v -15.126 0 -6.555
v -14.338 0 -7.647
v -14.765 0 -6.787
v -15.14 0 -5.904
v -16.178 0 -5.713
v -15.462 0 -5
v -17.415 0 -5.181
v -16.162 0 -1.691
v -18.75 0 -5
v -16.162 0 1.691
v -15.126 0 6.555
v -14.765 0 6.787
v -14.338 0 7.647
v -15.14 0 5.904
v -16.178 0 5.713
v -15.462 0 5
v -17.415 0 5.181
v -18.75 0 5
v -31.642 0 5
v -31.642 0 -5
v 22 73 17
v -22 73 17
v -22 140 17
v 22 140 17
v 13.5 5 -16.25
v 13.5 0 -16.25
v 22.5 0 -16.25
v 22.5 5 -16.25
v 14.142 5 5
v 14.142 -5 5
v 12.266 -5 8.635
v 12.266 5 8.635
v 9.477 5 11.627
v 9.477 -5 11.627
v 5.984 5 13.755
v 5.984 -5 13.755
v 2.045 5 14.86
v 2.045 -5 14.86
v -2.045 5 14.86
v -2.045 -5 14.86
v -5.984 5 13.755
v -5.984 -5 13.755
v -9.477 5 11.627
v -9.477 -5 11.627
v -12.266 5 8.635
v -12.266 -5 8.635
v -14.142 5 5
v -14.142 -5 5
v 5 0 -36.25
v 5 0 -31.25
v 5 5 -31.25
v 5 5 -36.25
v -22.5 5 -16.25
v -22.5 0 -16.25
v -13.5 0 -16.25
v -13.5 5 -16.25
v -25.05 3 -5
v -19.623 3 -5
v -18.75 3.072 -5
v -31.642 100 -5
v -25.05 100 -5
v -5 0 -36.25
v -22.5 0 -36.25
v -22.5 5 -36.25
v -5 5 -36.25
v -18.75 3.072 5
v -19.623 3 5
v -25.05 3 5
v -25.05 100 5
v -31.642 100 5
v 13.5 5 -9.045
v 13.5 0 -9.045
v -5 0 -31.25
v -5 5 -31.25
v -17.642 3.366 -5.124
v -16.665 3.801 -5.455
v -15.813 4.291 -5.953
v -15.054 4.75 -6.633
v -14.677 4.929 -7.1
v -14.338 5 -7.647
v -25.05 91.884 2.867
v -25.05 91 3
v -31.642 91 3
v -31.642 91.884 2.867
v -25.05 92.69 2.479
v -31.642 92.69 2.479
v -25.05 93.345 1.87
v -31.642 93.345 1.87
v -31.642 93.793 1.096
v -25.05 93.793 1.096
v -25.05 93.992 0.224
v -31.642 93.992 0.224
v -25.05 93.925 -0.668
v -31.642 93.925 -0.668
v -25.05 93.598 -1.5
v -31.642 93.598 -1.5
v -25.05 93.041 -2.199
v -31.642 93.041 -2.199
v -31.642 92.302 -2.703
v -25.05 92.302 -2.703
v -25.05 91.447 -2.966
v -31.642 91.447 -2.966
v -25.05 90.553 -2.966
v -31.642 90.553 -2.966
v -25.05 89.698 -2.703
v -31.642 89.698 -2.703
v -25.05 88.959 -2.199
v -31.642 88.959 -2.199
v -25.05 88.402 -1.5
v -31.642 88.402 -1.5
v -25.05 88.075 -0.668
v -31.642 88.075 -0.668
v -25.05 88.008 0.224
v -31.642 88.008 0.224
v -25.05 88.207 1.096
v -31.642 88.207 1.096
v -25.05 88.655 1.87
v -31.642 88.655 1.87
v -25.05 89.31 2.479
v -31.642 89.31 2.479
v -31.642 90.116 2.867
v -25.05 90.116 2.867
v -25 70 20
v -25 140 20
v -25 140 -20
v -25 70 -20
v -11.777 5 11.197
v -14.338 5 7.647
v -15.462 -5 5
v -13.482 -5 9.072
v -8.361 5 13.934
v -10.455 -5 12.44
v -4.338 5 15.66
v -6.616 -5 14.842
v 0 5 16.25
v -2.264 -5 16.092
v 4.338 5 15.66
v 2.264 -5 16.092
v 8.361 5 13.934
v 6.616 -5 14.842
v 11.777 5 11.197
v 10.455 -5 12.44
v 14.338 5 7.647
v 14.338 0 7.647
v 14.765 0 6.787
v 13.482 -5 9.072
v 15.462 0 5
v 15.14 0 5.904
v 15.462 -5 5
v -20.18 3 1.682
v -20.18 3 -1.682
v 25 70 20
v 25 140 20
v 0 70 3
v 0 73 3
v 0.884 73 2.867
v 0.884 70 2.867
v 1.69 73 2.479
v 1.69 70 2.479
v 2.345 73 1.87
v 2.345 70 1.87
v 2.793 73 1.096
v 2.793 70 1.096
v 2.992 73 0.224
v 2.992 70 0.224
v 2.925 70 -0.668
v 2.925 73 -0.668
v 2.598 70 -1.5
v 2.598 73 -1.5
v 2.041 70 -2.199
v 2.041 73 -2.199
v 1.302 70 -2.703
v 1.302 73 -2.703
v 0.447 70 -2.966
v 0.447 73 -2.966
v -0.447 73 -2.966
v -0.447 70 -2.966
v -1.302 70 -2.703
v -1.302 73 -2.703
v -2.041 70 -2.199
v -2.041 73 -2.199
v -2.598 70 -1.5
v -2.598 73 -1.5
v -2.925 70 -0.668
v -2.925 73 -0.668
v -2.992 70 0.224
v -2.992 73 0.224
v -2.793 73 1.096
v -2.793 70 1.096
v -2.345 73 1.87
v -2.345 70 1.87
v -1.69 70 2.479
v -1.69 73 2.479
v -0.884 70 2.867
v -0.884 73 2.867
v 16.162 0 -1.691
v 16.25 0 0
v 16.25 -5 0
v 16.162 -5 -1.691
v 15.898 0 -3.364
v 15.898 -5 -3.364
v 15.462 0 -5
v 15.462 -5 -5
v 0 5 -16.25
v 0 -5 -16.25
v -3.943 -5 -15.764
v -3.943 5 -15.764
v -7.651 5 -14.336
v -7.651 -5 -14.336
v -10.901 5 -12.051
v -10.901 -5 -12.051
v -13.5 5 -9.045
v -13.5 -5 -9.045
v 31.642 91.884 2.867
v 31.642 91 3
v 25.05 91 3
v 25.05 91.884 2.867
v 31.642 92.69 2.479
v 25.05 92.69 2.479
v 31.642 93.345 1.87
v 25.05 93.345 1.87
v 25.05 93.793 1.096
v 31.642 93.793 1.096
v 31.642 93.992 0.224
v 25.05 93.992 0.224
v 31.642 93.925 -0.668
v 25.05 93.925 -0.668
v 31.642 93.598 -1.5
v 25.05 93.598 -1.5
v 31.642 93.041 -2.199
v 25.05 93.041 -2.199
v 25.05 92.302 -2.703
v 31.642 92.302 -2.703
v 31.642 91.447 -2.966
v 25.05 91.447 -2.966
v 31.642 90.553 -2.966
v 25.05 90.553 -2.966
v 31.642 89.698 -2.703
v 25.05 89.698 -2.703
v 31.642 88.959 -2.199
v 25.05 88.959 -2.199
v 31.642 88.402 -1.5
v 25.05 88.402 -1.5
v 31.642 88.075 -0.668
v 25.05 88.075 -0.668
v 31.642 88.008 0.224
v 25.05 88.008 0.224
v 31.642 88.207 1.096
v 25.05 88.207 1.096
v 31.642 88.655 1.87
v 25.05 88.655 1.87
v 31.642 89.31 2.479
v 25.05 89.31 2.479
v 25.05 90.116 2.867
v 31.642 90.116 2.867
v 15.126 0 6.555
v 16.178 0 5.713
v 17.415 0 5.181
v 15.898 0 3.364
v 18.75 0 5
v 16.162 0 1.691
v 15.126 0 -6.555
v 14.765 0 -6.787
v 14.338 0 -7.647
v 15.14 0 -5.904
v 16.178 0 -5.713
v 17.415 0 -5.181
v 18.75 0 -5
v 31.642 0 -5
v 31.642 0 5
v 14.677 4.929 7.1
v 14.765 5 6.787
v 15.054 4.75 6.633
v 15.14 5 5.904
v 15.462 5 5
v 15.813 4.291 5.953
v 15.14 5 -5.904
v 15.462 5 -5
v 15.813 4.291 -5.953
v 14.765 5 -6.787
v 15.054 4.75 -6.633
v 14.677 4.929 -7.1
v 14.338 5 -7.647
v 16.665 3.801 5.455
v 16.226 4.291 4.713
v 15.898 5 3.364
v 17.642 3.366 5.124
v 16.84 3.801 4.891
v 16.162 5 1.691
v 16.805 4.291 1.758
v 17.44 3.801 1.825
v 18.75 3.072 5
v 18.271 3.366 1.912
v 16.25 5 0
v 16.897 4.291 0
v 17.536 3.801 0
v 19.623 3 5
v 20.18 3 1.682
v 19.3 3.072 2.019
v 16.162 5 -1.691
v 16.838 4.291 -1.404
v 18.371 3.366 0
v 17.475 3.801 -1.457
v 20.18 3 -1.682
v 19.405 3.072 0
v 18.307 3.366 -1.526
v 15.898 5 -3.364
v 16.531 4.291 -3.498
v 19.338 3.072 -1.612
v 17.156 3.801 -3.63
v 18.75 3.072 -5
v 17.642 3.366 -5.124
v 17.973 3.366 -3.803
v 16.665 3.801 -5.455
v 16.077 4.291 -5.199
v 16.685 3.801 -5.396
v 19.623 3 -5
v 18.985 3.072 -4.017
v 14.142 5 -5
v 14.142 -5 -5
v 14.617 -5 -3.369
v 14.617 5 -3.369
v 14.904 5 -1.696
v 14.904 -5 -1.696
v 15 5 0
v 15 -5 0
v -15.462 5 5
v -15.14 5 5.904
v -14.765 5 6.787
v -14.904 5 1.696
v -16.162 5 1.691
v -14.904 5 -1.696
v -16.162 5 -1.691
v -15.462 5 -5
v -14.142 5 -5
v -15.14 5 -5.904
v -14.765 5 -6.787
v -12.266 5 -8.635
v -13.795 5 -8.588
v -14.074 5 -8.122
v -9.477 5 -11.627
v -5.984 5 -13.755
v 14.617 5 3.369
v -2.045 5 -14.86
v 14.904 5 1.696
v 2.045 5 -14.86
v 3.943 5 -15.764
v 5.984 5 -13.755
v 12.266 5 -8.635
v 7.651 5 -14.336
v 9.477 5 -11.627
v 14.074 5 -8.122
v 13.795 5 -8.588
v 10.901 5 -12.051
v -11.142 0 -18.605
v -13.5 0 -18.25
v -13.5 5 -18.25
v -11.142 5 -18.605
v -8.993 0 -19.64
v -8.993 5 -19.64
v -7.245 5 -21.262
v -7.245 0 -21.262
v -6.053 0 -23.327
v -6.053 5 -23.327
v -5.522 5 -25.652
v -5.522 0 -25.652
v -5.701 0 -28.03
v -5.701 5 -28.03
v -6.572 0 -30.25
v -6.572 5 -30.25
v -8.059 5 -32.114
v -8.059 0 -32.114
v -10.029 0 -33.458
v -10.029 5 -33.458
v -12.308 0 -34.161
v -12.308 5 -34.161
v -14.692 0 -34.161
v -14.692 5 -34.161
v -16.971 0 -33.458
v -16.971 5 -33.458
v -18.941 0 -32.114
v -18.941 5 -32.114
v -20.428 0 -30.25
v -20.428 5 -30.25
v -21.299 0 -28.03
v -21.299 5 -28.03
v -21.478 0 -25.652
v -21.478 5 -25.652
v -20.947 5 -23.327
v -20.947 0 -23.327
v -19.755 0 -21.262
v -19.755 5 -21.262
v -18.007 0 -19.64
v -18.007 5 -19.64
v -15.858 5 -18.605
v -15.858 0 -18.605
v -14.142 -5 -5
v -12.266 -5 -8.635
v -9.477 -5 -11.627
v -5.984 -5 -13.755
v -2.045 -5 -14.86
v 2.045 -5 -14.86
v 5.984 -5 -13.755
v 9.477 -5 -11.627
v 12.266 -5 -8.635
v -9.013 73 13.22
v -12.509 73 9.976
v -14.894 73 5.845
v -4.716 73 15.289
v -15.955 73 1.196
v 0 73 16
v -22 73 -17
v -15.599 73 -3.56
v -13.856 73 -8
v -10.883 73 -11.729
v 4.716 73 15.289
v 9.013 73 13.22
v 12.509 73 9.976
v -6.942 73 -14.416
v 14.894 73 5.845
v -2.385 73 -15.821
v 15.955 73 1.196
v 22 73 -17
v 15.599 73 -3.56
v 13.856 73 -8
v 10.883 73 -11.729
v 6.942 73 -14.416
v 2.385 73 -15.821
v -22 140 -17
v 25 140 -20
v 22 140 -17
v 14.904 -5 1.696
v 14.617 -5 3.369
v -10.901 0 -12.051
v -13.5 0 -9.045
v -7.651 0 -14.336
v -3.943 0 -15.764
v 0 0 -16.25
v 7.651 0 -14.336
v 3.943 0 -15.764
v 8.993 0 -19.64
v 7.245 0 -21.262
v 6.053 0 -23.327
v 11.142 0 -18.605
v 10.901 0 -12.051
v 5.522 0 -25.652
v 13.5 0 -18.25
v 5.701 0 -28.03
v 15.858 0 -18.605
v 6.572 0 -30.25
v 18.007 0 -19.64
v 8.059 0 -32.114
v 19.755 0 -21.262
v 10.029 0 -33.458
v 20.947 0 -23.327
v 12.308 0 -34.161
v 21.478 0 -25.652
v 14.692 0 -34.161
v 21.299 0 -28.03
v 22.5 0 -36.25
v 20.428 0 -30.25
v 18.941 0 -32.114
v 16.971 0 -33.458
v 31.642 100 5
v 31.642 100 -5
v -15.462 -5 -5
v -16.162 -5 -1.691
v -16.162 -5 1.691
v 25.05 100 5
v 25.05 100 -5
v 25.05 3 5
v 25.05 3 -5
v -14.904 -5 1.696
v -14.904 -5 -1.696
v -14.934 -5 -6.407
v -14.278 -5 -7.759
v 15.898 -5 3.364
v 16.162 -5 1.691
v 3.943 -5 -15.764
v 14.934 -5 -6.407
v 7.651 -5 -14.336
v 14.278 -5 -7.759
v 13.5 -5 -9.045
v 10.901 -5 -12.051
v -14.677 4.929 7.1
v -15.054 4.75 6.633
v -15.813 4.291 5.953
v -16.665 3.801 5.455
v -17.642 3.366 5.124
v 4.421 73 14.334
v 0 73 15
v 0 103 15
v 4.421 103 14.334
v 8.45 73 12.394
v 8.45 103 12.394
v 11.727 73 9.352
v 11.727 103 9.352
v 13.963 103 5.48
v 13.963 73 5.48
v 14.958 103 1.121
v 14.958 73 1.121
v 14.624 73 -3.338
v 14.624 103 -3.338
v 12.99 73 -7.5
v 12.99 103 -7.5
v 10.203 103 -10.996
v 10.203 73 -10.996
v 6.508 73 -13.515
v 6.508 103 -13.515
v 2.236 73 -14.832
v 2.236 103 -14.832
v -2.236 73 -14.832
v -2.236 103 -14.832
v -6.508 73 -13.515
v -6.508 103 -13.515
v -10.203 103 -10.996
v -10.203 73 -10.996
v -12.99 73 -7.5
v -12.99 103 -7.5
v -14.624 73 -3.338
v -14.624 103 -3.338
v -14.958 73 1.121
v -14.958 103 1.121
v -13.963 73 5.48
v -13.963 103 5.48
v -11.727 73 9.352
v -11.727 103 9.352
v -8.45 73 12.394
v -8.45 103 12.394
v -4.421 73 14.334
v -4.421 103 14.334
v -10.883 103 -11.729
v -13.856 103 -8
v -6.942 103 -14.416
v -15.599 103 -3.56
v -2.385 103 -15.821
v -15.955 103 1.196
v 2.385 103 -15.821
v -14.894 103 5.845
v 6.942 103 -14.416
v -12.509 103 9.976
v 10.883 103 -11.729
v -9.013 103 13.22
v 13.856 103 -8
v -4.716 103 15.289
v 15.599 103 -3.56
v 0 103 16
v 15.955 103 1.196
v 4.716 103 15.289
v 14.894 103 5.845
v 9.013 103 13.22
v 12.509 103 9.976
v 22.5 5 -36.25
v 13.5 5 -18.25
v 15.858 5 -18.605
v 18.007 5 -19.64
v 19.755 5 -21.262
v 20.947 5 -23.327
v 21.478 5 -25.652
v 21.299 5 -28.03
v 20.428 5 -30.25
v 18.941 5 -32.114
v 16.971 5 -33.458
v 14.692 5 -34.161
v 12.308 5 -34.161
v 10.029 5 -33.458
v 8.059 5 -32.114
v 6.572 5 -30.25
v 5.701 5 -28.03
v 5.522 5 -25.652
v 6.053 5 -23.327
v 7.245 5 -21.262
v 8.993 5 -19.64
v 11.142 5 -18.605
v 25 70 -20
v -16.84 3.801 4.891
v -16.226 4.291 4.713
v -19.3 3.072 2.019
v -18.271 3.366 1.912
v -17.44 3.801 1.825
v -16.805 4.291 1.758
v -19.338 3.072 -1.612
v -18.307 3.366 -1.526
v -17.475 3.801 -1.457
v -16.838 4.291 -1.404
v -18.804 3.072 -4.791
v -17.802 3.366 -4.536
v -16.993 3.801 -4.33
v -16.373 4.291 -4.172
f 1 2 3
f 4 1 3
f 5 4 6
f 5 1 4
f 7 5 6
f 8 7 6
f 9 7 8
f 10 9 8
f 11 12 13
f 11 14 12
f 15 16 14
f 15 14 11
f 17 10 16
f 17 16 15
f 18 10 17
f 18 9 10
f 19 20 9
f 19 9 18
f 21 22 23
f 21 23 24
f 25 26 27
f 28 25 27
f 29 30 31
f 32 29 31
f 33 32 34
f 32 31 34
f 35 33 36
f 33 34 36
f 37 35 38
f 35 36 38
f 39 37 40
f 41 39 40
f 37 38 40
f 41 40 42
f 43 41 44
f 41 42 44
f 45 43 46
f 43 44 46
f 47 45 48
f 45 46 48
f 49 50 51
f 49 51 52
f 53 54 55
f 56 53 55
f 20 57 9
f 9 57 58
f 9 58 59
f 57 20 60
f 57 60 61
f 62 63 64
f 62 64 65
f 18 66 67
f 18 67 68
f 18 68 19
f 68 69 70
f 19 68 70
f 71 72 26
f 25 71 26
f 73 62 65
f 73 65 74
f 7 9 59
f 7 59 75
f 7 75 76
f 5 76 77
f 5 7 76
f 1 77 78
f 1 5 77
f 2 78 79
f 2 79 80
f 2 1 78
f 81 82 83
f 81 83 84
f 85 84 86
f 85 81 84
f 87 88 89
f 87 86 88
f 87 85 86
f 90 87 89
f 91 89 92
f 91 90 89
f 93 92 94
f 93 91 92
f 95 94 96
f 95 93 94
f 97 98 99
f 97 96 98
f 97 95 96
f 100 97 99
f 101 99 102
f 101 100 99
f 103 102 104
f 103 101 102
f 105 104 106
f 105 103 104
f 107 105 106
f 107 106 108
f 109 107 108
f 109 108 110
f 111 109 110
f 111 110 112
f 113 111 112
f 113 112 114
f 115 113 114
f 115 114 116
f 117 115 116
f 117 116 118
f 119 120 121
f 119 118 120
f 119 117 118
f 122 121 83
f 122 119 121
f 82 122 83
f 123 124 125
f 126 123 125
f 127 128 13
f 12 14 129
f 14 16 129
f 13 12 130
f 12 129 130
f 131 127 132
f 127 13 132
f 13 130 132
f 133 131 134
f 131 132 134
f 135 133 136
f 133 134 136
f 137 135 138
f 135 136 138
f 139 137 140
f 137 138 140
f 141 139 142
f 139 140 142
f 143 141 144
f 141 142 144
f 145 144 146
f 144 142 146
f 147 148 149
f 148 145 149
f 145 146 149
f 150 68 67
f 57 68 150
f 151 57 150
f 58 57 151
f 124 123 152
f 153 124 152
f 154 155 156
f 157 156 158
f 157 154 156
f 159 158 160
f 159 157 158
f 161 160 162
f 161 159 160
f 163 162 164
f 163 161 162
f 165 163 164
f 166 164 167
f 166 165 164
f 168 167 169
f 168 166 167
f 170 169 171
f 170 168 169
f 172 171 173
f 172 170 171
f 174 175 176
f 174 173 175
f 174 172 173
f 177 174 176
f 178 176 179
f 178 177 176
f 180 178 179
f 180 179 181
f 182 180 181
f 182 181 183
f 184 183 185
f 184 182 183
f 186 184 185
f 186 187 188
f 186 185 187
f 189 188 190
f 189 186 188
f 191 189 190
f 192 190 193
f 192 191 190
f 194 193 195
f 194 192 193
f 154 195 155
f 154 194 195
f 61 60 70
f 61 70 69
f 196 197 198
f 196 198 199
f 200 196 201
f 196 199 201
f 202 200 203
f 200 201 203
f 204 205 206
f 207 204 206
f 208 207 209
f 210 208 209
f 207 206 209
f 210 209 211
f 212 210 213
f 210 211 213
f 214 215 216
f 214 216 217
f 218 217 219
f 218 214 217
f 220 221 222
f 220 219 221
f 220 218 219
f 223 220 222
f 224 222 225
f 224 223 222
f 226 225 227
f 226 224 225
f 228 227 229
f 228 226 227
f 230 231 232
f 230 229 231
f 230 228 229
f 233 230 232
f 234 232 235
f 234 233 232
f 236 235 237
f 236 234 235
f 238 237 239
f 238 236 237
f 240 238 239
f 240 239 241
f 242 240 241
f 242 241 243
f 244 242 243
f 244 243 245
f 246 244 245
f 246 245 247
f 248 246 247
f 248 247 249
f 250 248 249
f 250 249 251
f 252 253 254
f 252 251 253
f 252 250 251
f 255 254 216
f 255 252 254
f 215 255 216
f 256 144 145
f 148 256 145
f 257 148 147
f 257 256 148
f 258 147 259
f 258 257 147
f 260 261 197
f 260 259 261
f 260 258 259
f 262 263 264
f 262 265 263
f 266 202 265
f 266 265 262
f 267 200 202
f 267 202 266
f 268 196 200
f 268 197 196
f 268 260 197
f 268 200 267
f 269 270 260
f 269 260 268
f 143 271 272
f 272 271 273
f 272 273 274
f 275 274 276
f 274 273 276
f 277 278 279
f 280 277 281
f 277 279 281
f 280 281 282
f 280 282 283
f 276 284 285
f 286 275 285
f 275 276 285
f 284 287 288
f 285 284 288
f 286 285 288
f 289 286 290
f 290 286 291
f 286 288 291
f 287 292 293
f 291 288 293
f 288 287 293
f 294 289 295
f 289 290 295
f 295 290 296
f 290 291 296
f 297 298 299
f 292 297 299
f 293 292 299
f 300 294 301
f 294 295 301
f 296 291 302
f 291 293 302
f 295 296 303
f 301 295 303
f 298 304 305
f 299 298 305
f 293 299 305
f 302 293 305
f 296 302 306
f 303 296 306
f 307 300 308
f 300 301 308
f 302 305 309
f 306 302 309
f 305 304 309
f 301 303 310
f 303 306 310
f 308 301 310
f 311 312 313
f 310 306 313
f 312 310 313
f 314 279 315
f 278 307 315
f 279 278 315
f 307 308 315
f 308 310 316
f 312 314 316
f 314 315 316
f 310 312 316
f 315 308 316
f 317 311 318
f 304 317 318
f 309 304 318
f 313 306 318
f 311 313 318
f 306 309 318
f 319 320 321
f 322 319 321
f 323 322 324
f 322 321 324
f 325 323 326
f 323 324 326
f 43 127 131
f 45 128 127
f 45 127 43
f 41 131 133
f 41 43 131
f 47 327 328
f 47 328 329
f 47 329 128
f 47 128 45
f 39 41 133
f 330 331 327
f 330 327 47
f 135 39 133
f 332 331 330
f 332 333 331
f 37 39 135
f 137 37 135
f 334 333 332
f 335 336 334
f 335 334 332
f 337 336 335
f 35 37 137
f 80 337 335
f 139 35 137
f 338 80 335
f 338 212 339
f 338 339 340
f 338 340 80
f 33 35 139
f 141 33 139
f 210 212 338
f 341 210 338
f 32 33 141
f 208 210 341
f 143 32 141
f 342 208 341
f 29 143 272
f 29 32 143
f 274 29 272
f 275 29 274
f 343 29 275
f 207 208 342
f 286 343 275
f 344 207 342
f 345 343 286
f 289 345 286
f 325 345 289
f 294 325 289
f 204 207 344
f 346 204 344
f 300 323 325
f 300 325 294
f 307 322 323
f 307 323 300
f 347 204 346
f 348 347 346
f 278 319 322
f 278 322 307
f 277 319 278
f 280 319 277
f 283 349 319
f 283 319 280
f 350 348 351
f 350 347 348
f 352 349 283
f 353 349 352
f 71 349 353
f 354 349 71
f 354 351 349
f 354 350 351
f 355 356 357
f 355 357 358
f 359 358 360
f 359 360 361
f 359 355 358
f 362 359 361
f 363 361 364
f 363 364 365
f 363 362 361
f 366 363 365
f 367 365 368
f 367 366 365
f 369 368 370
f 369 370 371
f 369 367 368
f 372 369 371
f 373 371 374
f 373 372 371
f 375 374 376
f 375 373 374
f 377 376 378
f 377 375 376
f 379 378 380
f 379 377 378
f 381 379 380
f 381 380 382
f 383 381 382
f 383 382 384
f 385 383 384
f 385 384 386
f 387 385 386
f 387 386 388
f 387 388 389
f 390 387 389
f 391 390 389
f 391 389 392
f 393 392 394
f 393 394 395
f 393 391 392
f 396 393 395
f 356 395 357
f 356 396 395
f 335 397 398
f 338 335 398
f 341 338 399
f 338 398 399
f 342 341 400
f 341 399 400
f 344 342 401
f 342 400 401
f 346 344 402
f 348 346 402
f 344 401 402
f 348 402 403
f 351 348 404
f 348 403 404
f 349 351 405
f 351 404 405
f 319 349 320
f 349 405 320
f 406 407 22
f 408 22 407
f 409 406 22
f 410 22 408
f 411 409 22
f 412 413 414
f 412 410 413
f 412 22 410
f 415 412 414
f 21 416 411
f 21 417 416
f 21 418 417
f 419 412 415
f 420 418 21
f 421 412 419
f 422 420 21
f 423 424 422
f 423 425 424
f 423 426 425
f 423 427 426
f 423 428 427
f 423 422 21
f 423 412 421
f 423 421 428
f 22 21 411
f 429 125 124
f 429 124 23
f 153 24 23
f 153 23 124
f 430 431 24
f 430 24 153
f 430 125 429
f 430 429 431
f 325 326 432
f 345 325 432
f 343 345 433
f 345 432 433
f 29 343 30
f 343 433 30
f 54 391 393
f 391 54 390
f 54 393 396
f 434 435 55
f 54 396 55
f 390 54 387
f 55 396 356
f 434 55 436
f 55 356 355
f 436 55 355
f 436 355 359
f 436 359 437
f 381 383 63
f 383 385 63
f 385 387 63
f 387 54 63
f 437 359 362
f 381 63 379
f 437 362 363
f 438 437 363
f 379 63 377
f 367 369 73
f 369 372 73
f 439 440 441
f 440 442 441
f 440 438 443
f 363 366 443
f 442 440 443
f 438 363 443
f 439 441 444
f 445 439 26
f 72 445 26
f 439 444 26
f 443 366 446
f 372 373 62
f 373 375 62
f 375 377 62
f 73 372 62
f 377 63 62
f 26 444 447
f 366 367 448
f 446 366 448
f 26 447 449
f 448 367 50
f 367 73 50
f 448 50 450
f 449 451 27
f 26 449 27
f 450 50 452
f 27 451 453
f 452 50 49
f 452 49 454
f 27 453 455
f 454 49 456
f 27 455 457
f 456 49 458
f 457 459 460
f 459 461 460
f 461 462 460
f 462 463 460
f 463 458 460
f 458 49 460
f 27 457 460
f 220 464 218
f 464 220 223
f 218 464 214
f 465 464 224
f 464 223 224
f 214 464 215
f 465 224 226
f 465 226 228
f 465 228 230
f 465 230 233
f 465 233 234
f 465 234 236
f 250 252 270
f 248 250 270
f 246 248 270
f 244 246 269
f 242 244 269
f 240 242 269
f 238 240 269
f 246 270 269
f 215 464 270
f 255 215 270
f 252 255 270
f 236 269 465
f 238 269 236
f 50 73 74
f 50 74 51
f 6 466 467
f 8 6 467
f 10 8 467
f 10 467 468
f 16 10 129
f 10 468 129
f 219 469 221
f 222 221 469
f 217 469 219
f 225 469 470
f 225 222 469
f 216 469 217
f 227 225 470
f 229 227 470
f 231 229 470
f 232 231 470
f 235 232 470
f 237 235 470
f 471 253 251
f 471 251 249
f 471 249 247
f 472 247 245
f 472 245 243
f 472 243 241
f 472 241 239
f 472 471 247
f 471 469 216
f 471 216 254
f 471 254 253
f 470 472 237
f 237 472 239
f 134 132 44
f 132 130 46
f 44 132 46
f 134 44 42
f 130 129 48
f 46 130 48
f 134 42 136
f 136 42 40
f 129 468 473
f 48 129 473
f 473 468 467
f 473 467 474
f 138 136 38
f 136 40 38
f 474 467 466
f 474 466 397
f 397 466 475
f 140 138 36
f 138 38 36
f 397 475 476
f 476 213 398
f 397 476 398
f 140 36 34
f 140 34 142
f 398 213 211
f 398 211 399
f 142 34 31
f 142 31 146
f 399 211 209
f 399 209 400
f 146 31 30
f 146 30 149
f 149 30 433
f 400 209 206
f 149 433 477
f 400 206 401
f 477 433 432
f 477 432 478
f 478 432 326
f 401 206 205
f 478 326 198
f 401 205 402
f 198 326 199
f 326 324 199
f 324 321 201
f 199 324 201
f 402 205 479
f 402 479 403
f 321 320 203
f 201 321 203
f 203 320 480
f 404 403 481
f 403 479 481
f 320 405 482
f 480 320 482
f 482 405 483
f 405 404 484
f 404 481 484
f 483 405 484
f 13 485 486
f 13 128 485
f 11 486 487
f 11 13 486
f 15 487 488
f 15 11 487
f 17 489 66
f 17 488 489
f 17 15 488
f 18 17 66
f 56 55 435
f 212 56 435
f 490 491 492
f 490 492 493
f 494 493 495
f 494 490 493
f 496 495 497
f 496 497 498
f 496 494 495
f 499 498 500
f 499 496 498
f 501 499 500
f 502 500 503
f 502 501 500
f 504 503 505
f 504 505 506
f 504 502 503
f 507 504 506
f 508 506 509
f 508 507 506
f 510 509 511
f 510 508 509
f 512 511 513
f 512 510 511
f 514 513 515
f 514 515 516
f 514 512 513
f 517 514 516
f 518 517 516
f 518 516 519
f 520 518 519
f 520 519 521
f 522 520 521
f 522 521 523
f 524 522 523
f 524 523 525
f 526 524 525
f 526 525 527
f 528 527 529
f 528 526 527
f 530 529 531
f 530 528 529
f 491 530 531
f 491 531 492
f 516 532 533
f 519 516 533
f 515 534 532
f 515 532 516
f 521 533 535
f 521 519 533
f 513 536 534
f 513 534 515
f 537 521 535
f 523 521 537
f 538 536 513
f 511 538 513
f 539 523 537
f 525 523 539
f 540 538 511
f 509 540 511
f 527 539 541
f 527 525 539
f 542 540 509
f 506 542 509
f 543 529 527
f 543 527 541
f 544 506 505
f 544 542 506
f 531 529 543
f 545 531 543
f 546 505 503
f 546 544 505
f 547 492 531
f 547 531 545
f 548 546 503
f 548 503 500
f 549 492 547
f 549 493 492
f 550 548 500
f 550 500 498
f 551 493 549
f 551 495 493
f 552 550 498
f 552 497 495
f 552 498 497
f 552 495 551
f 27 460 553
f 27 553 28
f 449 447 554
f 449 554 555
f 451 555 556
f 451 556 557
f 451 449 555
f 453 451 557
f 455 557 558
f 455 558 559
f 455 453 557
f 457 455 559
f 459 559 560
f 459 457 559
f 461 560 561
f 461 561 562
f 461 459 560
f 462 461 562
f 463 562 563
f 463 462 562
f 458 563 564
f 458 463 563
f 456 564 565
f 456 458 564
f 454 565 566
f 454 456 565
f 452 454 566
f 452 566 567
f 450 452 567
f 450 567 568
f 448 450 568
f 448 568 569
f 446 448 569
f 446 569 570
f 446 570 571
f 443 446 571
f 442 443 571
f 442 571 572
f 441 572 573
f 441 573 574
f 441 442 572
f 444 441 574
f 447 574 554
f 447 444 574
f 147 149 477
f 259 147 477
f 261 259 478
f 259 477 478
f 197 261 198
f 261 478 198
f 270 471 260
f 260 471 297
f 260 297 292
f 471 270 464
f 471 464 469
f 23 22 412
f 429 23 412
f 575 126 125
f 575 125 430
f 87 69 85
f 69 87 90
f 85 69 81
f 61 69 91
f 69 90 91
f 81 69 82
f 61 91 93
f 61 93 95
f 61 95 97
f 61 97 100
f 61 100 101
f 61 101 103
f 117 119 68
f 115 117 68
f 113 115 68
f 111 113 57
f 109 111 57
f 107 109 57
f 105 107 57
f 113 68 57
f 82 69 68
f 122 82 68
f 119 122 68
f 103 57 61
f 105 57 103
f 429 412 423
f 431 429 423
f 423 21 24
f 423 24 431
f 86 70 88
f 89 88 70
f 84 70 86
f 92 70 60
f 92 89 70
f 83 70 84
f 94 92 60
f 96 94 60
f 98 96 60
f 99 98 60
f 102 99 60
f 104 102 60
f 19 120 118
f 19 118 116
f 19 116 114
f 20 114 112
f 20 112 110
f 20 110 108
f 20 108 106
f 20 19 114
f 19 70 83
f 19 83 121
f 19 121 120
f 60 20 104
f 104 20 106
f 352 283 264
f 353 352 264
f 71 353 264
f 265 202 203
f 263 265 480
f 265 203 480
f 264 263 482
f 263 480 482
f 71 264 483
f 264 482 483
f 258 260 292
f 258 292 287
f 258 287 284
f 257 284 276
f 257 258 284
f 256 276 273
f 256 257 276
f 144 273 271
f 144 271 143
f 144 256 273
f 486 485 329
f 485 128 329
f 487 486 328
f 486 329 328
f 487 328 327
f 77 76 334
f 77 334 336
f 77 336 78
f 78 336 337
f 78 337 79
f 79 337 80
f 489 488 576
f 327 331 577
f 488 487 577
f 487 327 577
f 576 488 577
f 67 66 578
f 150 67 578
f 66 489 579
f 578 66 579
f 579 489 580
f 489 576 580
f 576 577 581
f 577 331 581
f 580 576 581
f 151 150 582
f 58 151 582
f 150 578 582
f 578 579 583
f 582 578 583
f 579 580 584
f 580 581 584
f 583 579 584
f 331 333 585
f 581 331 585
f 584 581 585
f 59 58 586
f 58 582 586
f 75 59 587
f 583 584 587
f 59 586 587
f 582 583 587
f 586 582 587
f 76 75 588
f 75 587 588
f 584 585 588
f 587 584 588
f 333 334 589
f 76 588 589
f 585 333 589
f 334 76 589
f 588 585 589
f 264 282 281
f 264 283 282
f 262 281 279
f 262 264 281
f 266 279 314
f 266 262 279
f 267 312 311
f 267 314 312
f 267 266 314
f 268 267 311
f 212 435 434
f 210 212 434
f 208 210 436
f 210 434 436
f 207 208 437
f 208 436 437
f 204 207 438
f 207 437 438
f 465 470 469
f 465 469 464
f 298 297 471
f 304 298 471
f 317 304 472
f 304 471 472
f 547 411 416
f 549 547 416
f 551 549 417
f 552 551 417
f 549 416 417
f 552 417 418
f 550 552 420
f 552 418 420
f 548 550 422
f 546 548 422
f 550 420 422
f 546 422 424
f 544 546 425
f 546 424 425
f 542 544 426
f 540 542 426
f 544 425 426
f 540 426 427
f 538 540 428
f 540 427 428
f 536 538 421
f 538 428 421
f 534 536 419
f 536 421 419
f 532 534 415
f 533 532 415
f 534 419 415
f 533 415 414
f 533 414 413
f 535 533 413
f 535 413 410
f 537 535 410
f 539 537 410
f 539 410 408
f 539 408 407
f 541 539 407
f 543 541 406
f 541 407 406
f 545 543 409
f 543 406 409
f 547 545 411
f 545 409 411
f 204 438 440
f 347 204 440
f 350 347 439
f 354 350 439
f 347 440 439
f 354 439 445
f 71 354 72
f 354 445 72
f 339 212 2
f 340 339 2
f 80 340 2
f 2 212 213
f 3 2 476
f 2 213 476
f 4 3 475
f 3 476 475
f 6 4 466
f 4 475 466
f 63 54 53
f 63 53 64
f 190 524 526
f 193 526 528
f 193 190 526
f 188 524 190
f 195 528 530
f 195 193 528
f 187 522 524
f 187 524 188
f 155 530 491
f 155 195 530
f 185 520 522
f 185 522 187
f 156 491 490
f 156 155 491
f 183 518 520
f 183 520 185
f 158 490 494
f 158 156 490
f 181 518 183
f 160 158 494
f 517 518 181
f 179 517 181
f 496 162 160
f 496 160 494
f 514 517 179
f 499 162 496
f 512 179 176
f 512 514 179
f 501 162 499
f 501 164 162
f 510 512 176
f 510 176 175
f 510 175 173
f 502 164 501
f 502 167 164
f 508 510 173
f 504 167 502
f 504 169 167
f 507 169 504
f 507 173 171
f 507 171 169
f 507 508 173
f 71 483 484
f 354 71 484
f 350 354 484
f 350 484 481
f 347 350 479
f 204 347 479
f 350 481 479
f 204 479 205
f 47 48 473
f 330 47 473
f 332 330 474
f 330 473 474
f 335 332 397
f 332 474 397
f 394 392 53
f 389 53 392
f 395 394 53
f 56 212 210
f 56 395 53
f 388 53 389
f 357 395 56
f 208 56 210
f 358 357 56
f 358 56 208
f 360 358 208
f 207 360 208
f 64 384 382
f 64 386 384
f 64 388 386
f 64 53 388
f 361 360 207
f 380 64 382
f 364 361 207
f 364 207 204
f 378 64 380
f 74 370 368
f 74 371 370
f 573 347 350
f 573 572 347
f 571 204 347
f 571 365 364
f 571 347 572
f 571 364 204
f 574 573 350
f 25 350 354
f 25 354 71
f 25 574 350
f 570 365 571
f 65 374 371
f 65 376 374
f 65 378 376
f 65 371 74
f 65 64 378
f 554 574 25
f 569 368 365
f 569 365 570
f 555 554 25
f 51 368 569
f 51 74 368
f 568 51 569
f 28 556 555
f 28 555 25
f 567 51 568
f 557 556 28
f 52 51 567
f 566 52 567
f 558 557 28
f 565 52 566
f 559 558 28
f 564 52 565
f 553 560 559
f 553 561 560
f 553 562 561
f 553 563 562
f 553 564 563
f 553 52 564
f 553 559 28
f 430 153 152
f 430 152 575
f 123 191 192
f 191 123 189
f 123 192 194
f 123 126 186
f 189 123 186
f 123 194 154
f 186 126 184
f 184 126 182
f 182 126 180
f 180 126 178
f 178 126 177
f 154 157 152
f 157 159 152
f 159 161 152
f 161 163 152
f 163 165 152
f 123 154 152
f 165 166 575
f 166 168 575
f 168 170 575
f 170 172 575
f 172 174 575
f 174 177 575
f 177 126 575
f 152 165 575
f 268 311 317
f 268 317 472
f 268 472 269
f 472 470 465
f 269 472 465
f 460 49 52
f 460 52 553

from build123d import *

# Parameters (mm, degrees)
CONNECTOR_SLEEVE_DEPTH        = 5
CONNECTOR_SLEEVE_DEPTH_BACK   = 5
SKETCH3_W                     = 50
SKETCH3_H                     = 40
SKETCH3_R                     = 3
MOTOR_CASING_DEPTH            = 70
SHELL4_T                      = -3
SKETCH6_R                     = 16
SKETCH6_R_2                   = 15
MOTOR_SITS_HERE_DEPTH         = 30
SKETCH2_16_W                  = 6.592135624
SKETCH2_16_H                  = 10
SLEEVE_CASING_CONNECTOR_DEPTH = 3
SKETCH2_17_W                  = 6.592135624
SKETCH2_17_H                  = 10
SLEEVE_CASING_ARMS_DEPTH      = 100
SKETCH2_10_R                  = 8
SENSOR_HOLDER_DEPTH           = 5
FILLET2_R                     = 5
CUT_EXTRUDE5_DEPTH            = 124.769792437
CUT_EXTRUDE5_DEPTH_BACK       = 124.769792437
SKETCH8_R                     = 3


with BuildPart() as part:
    # Sketch2 → Connector sleeve (new, two sides: drawn at the far end of the back side and taken through both)
    with BuildSketch(Plane(origin=(0, 0, 0), x_dir=(1, 0, 0), z_dir=(0, 1, 0)).offset(-CONNECTOR_SLEEVE_DEPTH_BACK)):
        with BuildLine():
            Line((-14.142135624, -5), (-15.461646096, -5))
            ThreePointArc((-15.461646096, -5), (0, -16.25), (15.461646096, -5))
            Line((15.461646096, -5), (14.142135624, -5))
            ThreePointArc((14.142135624, -5), (0, -15), (-14.142135624, -5))
        make_face()
        with BuildLine():
            ThreePointArc((-13.5, 9.045026258), (-14.62138145, 7.090677295), (-15.461646096, 5))
            Line((-15.461646096, 5), (-14.142135624, 5))
            ThreePointArc((-14.142135624, 5), (0, 15), (14.142135624, 5))
            Line((14.142135624, 5), (15.461646096, 5))
            ThreePointArc((15.461646096, 5), (14.62138145, 7.090677295), (13.5, 9.045026258))
            ThreePointArc((13.5, 9.045026258), (7.651170607, 14.336041586), (0, 16.25))
            ThreePointArc((0, 16.25), (-7.651170607, 14.336041586), (-13.5, 9.045026258))
        make_face()
        with BuildLine():
            Line((15.461646096, 5), (14.142135624, 5))
            ThreePointArc((14.142135624, 5), (14.783978395, 2.536529681), (15, 0))
            ThreePointArc((15, 0), (14.783978395, -2.536529681), (14.142135624, -5))
            Line((14.142135624, -5), (15.461646096, -5))
            ThreePointArc((15.461646096, -5), (16.051701609, -2.530884326), (16.25, 0))
            ThreePointArc((16.25, 0), (16.051701609, 2.530884326), (15.461646096, 5))
        make_face()
        with BuildLine():
            Line((-14.142135624, 5), (-15.461646096, 5))
            ThreePointArc((-15.461646096, 5), (-16.25, 0), (-15.461646096, -5))
            Line((-15.461646096, -5), (-14.142135624, -5))
            ThreePointArc((-14.142135624, -5), (-15, 0), (-14.142135624, 5))
        make_face()
    extrude(amount=CONNECTOR_SLEEVE_DEPTH + CONNECTOR_SLEEVE_DEPTH_BACK)

    # Sketch2<16> → Sleeve-casing connector (add)
    with BuildSketch(Plane(origin=(0, 0, 0), x_dir=(1, 0, 0), z_dir=(0, 1, 0))):
        with BuildLine():
            Line((-15.461646096, 5), (-25.05, 5))
            Line((-25.05, 5), (-25.05, -5))
            Line((-25.05, -5), (-15.461646096, -5))
            ThreePointArc((-15.461646096, -5), (-16.25, 0), (-15.461646096, 5))
        make_face()
        with Locations((-28.346067812, 0)):
            Rectangle(SKETCH2_16_W, SKETCH2_16_H)
        with BuildLine():
            ThreePointArc((16.25, 0), (16.051701609, -2.530884326), (15.461646096, -5))
            Line((15.461646096, -5), (25.05, -5))
            Line((25.05, -5), (25.05, 5))
            Line((25.05, 5), (15.461646096, 5))
            ThreePointArc((15.461646096, 5), (16.051701609, 2.530884326), (16.25, 0))
        make_face()
        with Locations((28.346067812, 0)):
            Rectangle(SKETCH2_16_W, SKETCH2_16_H)
    extrude(amount=SLEEVE_CASING_CONNECTOR_DEPTH)

    # Sketch2<17> → Sleeve-casing arms (add)
    with BuildSketch(Plane(origin=(0, 0, 0), x_dir=(1, 0, 0), z_dir=(0, 1, 0))):
        with Locations((-28.346067812, 0)):
            Rectangle(SKETCH2_17_W, SKETCH2_17_H)
        with Locations((28.346067812, 0)):
            Rectangle(SKETCH2_17_W, SKETCH2_17_H)
    extrude(amount=SLEEVE_CASING_ARMS_DEPTH)

    # Fillet2
    # the kernel refuses this fillet: 5 mm, written as the material it adds along each edge
    with BuildSketch(Plane(origin=(0, 3, 0), x_dir=(-0.5992835092298462, 0, 0.8005368670868074), z_dir=(0.8005368670868074, 0, 0.5992835092298462))) as fillet2_piece_1_section:
        with BuildLine():
            CenterArc((20.25, -5), FILLET2_R, 90, 53.130102354)
            Line((20.25, 0), (20.25, 0.1))
            Line((20.25, 0.1), (16.25, 0.1))
            Line((16.25, 0.1), (16.15, 0))
            ThreePointArc((16.15, 0), (16.15, -1), (16.17, -1.94))
            Line((16.17, -1.94), (16.25, -2))
        make_face()
    fillet2_piece_1 = revolve(axis=Axis((0, 3, 0), (0, -1, 0)), revolution_arc=106.362800019, mode=Mode.PRIVATE)
    fillet2_piece_1 = split(fillet2_piece_1, bisect_by=Plane(origin=(-17.030163823, 3.512375165, -5), z_dir=(0, 0, 1)), keep=Keep.TOP, mode=Mode.PRIVATE)
    fillet2_piece_1 = split(fillet2_piece_1, bisect_by=Plane(origin=(-17.030163823, 3.512375165, 5), z_dir=(0, 0, -1)), keep=Keep.TOP, mode=Mode.PRIVATE)
    add(fillet2_piece_1)
    with BuildSketch(Plane(origin=(-15.461646096, 0, 5), x_dir=(0.3906724879832055, 0, 0.9205297426661521), z_dir=(0, 1, 0)), Plane(origin=(15.461646096, 0, -5), x_dir=(-0.39067248798317566, 0, -0.9205297426661648), z_dir=(0, 1, 0))) as fillet2_piece_2:
        with BuildLine():
            CenterArc((3.317979312, -4.980390013), FILLET2_R, 95.076136898, 61.927513064)
            Line((-1.284669401, -3.027027573), (-1.376722375, -2.987960324))
            Line((-1.376722375, -2.987960324), (-0.092052974, 0.039067249))
            Line((-0.092052974, 0.039067249), (0.008847945, 0.0996078))
            ThreePointArc((0.008847945, 0.0996078), (1.437791035, 0.036267542), (2.866734126, 0.0996078))
            Line((2.866734126, 0.0996078), (2.875582071, 0))
        make_face()
    extrude(amount=3)
    with BuildSketch(Plane(origin=(-15.461646096, 0, -5), x_dir=(0.3906724879831855, 0, -0.9205297426661605), z_dir=(0, 1, 0)), Plane(origin=(15.461646096, 0, 5), x_dir=(-0.3906724879831673, 0, 0.9205297426661683), z_dir=(0, 1, 0))) as fillet2_piece_3:
        with BuildLine():
            CenterArc((3.317979312, 4.980390013), FILLET2_R, 202.996350038, 61.927513064)
            Line((-1.284669401, 3.027027573), (-1.376722375, 2.987960324))
            Line((-1.376722375, 2.987960324), (-0.092052974, -0.039067249))
            Line((-0.092052974, -0.039067249), (0.008847945, -0.0996078))
            ThreePointArc((0.008847945, -0.0996078), (1.437791035, -0.036267542), (2.866734126, -0.0996078))
            Line((2.866734126, -0.0996078), (2.875582071, 0))
        make_face()
    extrude(amount=3)
    with BuildSketch(Plane(origin=(0, 3, 0), x_dir=(0.5992835092298779, 0, 0.8005368670867836), z_dir=(-0.8005368670867836, 0, 0.5992835092298779))) as fillet2_piece_4_section:
        with BuildLine():
            CenterArc((20.25, 5), FILLET2_R, 216.869897646, 53.130102354)
            Line((20.25, 0), (20.25, -0.1))
            Line((20.25, -0.1), (16.25, -0.1))
            Line((16.25, -0.1), (16.15, 0))
            ThreePointArc((16.15, 0), (16.15, 1), (16.17, 1.94))
            Line((16.17, 1.94), (16.25, 2))
        make_face()
    fillet2_piece_4 = revolve(axis=Axis((0, 3, 0), (0, 1, 0)), revolution_arc=106.362800019, mode=Mode.PRIVATE)
    fillet2_piece_4 = split(fillet2_piece_4, bisect_by=Plane(origin=(17.030163823, 3.512375165, 5), z_dir=(0, 0, -1)), keep=Keep.TOP, mode=Mode.PRIVATE)
    fillet2_piece_4 = split(fillet2_piece_4, bisect_by=Plane(origin=(17.030163823, 3.512375165, -5), z_dir=(0, 0, 1)), keep=Keep.TOP, mode=Mode.PRIVATE)
    add(fillet2_piece_4)
    with BuildSketch(Plane(origin=(0, 3, 0), x_dir=(-0.5992835092298462, 0, 0.8005368670868074), z_dir=(0.8005368670868074, 0, 0.5992835092298462))) as fillet2_piece_5a_section:
        with BuildLine():
            CenterArc((20.25, -5), FILLET2_R, 90, 53.130102354)
            Line((20.25, 0), (20.25, 0.1))
            Line((20.25, 0.1), (16.25, 0.1))
            Line((16.25, 0.1), (16.15, 0))
            ThreePointArc((16.15, 0), (16.15, -1), (16.17, -1.94))
            Line((16.17, -1.94), (16.25, -2))
        make_face()
    fillet2_piece_5a = revolve(axis=Axis((0, 3, 0), (0, -1, 0)), revolution_arc=106.362800019, mode=Mode.PRIVATE)
    fillet2_piece_5a = split(fillet2_piece_5a, bisect_by=Plane(origin=(-13.980724367, 3.489518258, 5), z_dir=(0, 0, 1)), keep=Keep.TOP, mode=Mode.PRIVATE)
    with BuildSketch(Plane(origin=(-15.461646096, 0, 5), x_dir=(0.3906724879832055, 0, 0.9205297426661521), z_dir=(0, 1, 0))) as fillet2_piece_5b_section:
        with BuildLine():
            CenterArc((3.317979312, -4.980390013), FILLET2_R, 95.076136898, 61.927513064)
            Line((-1.284669401, -3.027027573), (-1.376722375, -2.987960324))
            Line((-1.376722375, -2.987960324), (-0.092052974, 0.039067249))
            Line((-0.092052974, 0.039067249), (0.008847945, 0.0996078))
            ThreePointArc((0.008847945, 0.0996078), (1.437791035, 0.036267542), (2.866734126, 0.0996078))
            Line((2.866734126, 0.0996078), (2.875582071, 0))
        make_face()
    fillet2_piece_5b = extrude(amount=11.22088476, mode=Mode.PRIVATE)
    fillet2_piece_5b = split(fillet2_piece_5b, bisect_by=Plane(origin=(-15.995215442, 5, 5.576522303), z_dir=(0, -1, 0)), keep=Keep.TOP, mode=Mode.PRIVATE)
    fillet2_piece_5b = split(fillet2_piece_5b, bisect_by=Plane(origin=(-15.995215442, 3, 5.576522303), z_dir=(0, 1, 0)), keep=Keep.TOP, mode=Mode.PRIVATE)
    fillet2_piece_5 = fillet2_piece_5a & fillet2_piece_5b
    add(fillet2_piece_5)
    with BuildSketch(Plane(origin=(-15.461646096, 0, -5), x_dir=(0.3906724879831855, 0, -0.9205297426661605), z_dir=(0, 1, 0))) as fillet2_piece_6a_section:
        with BuildLine():
            CenterArc((3.317979312, 4.980390013), FILLET2_R, 202.996350038, 61.927513064)
            Line((-1.284669401, 3.027027573), (-1.376722375, 2.987960324))
            Line((-1.376722375, 2.987960324), (-0.092052974, -0.039067249))
            Line((-0.092052974, -0.039067249), (0.008847945, -0.0996078))
            ThreePointArc((0.008847945, -0.0996078), (1.437791035, -0.036267542), (2.866734126, -0.0996078))
            Line((2.866734126, -0.0996078), (2.875582071, 0))
        make_face()
    fillet2_piece_6a = extrude(amount=11.22088476, mode=Mode.PRIVATE)
    fillet2_piece_6a = split(fillet2_piece_6a, bisect_by=Plane(origin=(-15.995215442, 5, -5.576522303), z_dir=(0, -1, 0)), keep=Keep.TOP, mode=Mode.PRIVATE)
    fillet2_piece_6a = split(fillet2_piece_6a, bisect_by=Plane(origin=(-15.995215442, 3, -5.576522303), z_dir=(0, 1, 0)), keep=Keep.TOP, mode=Mode.PRIVATE)
    with BuildSketch(Plane(origin=(0, 3, 0), x_dir=(-0.5992835092298462, 0, 0.8005368670868074), z_dir=(0.8005368670868074, 0, 0.5992835092298462))) as fillet2_piece_6b_section:
        with BuildLine():
            CenterArc((20.25, -5), FILLET2_R, 90, 53.130102354)
            Line((20.25, 0), (20.25, 0.1))
            Line((20.25, 0.1), (16.25, 0.1))
            Line((16.25, 0.1), (16.15, 0))
            ThreePointArc((16.15, 0), (16.15, -1), (16.17, -1.94))
            Line((16.17, -1.94), (16.25, -2))
        make_face()
    fillet2_piece_6b = revolve(axis=Axis((0, 3, 0), (0, -1, 0)), revolution_arc=106.362800019, mode=Mode.PRIVATE)
    fillet2_piece_6b = split(fillet2_piece_6b, bisect_by=Plane(origin=(-13.980724067, 3.489518328, -5), z_dir=(0, 0, -1)), keep=Keep.TOP, mode=Mode.PRIVATE)
    fillet2_piece_6 = fillet2_piece_6a & fillet2_piece_6b
    add(fillet2_piece_6)
    with BuildSketch(Plane(origin=(15.461646096, 0, 5), x_dir=(-0.3906724879831673, 0, 0.9205297426661683), z_dir=(0, 1, 0))) as fillet2_piece_7a_section:
        with BuildLine():
            CenterArc((3.317979312, 4.980390013), FILLET2_R, 202.996350038, 61.927513064)
            Line((-1.284669401, 3.027027573), (-1.376722375, 2.987960324))
            Line((-1.376722375, 2.987960324), (-0.092052974, -0.039067249))
            Line((-0.092052974, -0.039067249), (0.008847945, -0.0996078))
            ThreePointArc((0.008847945, -0.0996078), (1.437791035, -0.036267542), (2.866734126, -0.0996078))
            Line((2.866734126, -0.0996078), (2.875582071, 0))
        make_face()
    fillet2_piece_7a = extrude(amount=11.22088476, mode=Mode.PRIVATE)
    fillet2_piece_7a = split(fillet2_piece_7a, bisect_by=Plane(origin=(15.995215442, 5, 5.576522303), z_dir=(0, -1, 0)), keep=Keep.TOP, mode=Mode.PRIVATE)
    fillet2_piece_7a = split(fillet2_piece_7a, bisect_by=Plane(origin=(15.995215442, 3, 5.576522303), z_dir=(0, 1, 0)), keep=Keep.TOP, mode=Mode.PRIVATE)
    with BuildSketch(Plane(origin=(0, 3, 0), x_dir=(0.5992835092298779, 0, 0.8005368670867836), z_dir=(-0.8005368670867836, 0, 0.5992835092298779))) as fillet2_piece_7b_section:
        with BuildLine():
            CenterArc((20.25, 5), FILLET2_R, 216.869897646, 53.130102354)
            Line((20.25, 0), (20.25, -0.1))
            Line((20.25, -0.1), (16.25, -0.1))
            Line((16.25, -0.1), (16.15, 0))
            ThreePointArc((16.15, 0), (16.15, 1), (16.17, 1.94))
            Line((16.17, 1.94), (16.25, 2))
        make_face()
    fillet2_piece_7b = revolve(axis=Axis((0, 3, 0), (0, 1, 0)), revolution_arc=106.362800019, mode=Mode.PRIVATE)
    fillet2_piece_7b = split(fillet2_piece_7b, bisect_by=Plane(origin=(13.980724666, 3.489518219, 5), z_dir=(0, 0, 1)), keep=Keep.TOP, mode=Mode.PRIVATE)
    fillet2_piece_7 = fillet2_piece_7a & fillet2_piece_7b
    add(fillet2_piece_7)
    with BuildSketch(Plane(origin=(0, 3, 0), x_dir=(0.5992835092298779, 0, 0.8005368670867836), z_dir=(-0.8005368670867836, 0, 0.5992835092298779))) as fillet2_piece_8a_section:
        with BuildLine():
            CenterArc((20.25, 5), FILLET2_R, 216.869897646, 53.130102354)
            Line((20.25, 0), (20.25, -0.1))
            Line((20.25, -0.1), (16.25, -0.1))
            Line((16.25, -0.1), (16.15, 0))
            ThreePointArc((16.15, 0), (16.15, 1), (16.17, 1.94))
            Line((16.17, 1.94), (16.25, 2))
        make_face()
    fillet2_piece_8a = revolve(axis=Axis((0, 3, 0), (0, 1, 0)), revolution_arc=106.362800019, mode=Mode.PRIVATE)
    fillet2_piece_8a = split(fillet2_piece_8a, bisect_by=Plane(origin=(13.980723768, 3.489518367, -5), z_dir=(0, 0, -1)), keep=Keep.TOP, mode=Mode.PRIVATE)
    with BuildSketch(Plane(origin=(15.461646096, 0, -5), x_dir=(-0.39067248798317566, 0, -0.9205297426661648), z_dir=(0, 1, 0))) as fillet2_piece_8b_section:
        with BuildLine():
            CenterArc((3.317979312, -4.980390013), FILLET2_R, 95.076136898, 61.927513064)
            Line((-1.284669401, -3.027027573), (-1.376722375, -2.987960324))
            Line((-1.376722375, -2.987960324), (-0.092052974, 0.039067249))
            Line((-0.092052974, 0.039067249), (0.008847945, 0.0996078))
            ThreePointArc((0.008847945, 0.0996078), (1.437791035, 0.036267542), (2.866734126, 0.0996078))
            Line((2.866734126, 0.0996078), (2.875582071, 0))
        make_face()
    fillet2_piece_8b = extrude(amount=11.22088476, mode=Mode.PRIVATE)
    fillet2_piece_8b = split(fillet2_piece_8b, bisect_by=Plane(origin=(15.995215442, 5, -5.576522303), z_dir=(0, -1, 0)), keep=Keep.TOP, mode=Mode.PRIVATE)
    fillet2_piece_8b = split(fillet2_piece_8b, bisect_by=Plane(origin=(15.995215442, 3, -5.576522303), z_dir=(0, 1, 0)), keep=Keep.TOP, mode=Mode.PRIVATE)
    fillet2_piece_8 = fillet2_piece_8a & fillet2_piece_8b
    add(fillet2_piece_8)

    # Sketch8 → Cut-Extrude5 (cut, two sides: drawn at the far end of the back side and taken through both)
    with BuildSketch(Plane.ZY.offset(31.642135624).offset(-CUT_EXTRUDE5_DEPTH_BACK)):
        with Locations((0, 91)):
            Circle(SKETCH8_R)
    extrude(amount=CUT_EXTRUDE5_DEPTH + CUT_EXTRUDE5_DEPTH_BACK, mode=Mode.SUBTRACT)


with BuildPart() as body_2:
    # Sketch3 → Motor casing (new body)
    with BuildSketch(Plane(origin=(0, 30, 0), x_dir=(1, 0, 0), z_dir=(0, 1, 0))):
        Rectangle(SKETCH3_W, SKETCH3_H)
        with Locations(Location((0, 0, 0), (0, 0, 270))):
            Circle(SKETCH3_R, mode=Mode.SUBTRACT)
    extrude(amount=MOTOR_CASING_DEPTH)

    # Shell4
    shell4_openings = [body_2.faces().sort_by_distance(p)[0] for p in [
        (0, 100, -19.359687576),
        (0, 65, -3),
    ]]
    offset(amount=SHELL4_T, openings=shell4_openings, kind=Kind.INTERSECTION)

    # Sketch6 → Motor sits here (add)
    with BuildSketch(Plane(origin=(0, 33, 0), x_dir=(1, 0, 0), z_dir=(0, 1, 0))):
        with Locations(Location((0, 0, 0), (0, 0, 270))):
            Circle(SKETCH6_R)
        with Locations(Location((0, 0, 0), (0, 0, 270))):
            Circle(SKETCH6_R_2, mode=Mode.SUBTRACT)
    extrude(amount=MOTOR_SITS_HERE_DEPTH)


with BuildPart() as body_3:
    # Sketch2<10> → Sensor holder (new body)
    # profile 1 of 3: a face of its own
    with BuildSketch(Plane(origin=(0, 0, 0), x_dir=(1, 0, 0), z_dir=(0, 1, 0))):
        Polygon((5, 31.25), (5, 36.25), (22.5, 36.25), (22.5, 16.25), (0, 16.25), (-22.5, 16.25), (-22.5, 36.25), (-5, 36.25), (-5, 31.25), align=None)
        with Locations(Location((13.5, 26.25, 0), (0, 0, 270))):
            Circle(SKETCH2_10_R, mode=Mode.SUBTRACT)
        with Locations(Location((-13.5, 26.25, 0), (0, 0, 270))):
            Circle(SKETCH2_10_R, mode=Mode.SUBTRACT)
    # profile 2 of 3: a face of its own
    with BuildSketch(Plane(origin=(0, 0, 0), x_dir=(1, 0, 0), z_dir=(0, 1, 0))):
        with BuildLine():
            Line((-13.5, 16.25), (-13.5, 9.045026258))
            ThreePointArc((-13.5, 9.045026258), (-7.651170607, 14.336041586), (0, 16.25))
            Line((0, 16.25), (-13.5, 16.25))
        make_face()
    # profile 3 of 3: a face of its own
    with BuildSketch(Plane(origin=(0, 0, 0), x_dir=(1, 0, 0), z_dir=(0, 1, 0))):
        with BuildLine():
            Line((13.5, 16.25), (0, 16.25))
            ThreePointArc((0, 16.25), (7.651170607, 14.336041586), (13.5, 9.045026258))
            Line((13.5, 9.045026258), (13.5, 16.25))
        make_face()
    extrude(amount=SENSOR_HOLDER_DEPTH)


with BuildPart() as body_2_1:
    # Body-Move/Copy3: moved
    add(body_2.part.moved(Location((0, 40, 0))))


solid = Compound([part.part, body_3.part, body_2_1.part])
